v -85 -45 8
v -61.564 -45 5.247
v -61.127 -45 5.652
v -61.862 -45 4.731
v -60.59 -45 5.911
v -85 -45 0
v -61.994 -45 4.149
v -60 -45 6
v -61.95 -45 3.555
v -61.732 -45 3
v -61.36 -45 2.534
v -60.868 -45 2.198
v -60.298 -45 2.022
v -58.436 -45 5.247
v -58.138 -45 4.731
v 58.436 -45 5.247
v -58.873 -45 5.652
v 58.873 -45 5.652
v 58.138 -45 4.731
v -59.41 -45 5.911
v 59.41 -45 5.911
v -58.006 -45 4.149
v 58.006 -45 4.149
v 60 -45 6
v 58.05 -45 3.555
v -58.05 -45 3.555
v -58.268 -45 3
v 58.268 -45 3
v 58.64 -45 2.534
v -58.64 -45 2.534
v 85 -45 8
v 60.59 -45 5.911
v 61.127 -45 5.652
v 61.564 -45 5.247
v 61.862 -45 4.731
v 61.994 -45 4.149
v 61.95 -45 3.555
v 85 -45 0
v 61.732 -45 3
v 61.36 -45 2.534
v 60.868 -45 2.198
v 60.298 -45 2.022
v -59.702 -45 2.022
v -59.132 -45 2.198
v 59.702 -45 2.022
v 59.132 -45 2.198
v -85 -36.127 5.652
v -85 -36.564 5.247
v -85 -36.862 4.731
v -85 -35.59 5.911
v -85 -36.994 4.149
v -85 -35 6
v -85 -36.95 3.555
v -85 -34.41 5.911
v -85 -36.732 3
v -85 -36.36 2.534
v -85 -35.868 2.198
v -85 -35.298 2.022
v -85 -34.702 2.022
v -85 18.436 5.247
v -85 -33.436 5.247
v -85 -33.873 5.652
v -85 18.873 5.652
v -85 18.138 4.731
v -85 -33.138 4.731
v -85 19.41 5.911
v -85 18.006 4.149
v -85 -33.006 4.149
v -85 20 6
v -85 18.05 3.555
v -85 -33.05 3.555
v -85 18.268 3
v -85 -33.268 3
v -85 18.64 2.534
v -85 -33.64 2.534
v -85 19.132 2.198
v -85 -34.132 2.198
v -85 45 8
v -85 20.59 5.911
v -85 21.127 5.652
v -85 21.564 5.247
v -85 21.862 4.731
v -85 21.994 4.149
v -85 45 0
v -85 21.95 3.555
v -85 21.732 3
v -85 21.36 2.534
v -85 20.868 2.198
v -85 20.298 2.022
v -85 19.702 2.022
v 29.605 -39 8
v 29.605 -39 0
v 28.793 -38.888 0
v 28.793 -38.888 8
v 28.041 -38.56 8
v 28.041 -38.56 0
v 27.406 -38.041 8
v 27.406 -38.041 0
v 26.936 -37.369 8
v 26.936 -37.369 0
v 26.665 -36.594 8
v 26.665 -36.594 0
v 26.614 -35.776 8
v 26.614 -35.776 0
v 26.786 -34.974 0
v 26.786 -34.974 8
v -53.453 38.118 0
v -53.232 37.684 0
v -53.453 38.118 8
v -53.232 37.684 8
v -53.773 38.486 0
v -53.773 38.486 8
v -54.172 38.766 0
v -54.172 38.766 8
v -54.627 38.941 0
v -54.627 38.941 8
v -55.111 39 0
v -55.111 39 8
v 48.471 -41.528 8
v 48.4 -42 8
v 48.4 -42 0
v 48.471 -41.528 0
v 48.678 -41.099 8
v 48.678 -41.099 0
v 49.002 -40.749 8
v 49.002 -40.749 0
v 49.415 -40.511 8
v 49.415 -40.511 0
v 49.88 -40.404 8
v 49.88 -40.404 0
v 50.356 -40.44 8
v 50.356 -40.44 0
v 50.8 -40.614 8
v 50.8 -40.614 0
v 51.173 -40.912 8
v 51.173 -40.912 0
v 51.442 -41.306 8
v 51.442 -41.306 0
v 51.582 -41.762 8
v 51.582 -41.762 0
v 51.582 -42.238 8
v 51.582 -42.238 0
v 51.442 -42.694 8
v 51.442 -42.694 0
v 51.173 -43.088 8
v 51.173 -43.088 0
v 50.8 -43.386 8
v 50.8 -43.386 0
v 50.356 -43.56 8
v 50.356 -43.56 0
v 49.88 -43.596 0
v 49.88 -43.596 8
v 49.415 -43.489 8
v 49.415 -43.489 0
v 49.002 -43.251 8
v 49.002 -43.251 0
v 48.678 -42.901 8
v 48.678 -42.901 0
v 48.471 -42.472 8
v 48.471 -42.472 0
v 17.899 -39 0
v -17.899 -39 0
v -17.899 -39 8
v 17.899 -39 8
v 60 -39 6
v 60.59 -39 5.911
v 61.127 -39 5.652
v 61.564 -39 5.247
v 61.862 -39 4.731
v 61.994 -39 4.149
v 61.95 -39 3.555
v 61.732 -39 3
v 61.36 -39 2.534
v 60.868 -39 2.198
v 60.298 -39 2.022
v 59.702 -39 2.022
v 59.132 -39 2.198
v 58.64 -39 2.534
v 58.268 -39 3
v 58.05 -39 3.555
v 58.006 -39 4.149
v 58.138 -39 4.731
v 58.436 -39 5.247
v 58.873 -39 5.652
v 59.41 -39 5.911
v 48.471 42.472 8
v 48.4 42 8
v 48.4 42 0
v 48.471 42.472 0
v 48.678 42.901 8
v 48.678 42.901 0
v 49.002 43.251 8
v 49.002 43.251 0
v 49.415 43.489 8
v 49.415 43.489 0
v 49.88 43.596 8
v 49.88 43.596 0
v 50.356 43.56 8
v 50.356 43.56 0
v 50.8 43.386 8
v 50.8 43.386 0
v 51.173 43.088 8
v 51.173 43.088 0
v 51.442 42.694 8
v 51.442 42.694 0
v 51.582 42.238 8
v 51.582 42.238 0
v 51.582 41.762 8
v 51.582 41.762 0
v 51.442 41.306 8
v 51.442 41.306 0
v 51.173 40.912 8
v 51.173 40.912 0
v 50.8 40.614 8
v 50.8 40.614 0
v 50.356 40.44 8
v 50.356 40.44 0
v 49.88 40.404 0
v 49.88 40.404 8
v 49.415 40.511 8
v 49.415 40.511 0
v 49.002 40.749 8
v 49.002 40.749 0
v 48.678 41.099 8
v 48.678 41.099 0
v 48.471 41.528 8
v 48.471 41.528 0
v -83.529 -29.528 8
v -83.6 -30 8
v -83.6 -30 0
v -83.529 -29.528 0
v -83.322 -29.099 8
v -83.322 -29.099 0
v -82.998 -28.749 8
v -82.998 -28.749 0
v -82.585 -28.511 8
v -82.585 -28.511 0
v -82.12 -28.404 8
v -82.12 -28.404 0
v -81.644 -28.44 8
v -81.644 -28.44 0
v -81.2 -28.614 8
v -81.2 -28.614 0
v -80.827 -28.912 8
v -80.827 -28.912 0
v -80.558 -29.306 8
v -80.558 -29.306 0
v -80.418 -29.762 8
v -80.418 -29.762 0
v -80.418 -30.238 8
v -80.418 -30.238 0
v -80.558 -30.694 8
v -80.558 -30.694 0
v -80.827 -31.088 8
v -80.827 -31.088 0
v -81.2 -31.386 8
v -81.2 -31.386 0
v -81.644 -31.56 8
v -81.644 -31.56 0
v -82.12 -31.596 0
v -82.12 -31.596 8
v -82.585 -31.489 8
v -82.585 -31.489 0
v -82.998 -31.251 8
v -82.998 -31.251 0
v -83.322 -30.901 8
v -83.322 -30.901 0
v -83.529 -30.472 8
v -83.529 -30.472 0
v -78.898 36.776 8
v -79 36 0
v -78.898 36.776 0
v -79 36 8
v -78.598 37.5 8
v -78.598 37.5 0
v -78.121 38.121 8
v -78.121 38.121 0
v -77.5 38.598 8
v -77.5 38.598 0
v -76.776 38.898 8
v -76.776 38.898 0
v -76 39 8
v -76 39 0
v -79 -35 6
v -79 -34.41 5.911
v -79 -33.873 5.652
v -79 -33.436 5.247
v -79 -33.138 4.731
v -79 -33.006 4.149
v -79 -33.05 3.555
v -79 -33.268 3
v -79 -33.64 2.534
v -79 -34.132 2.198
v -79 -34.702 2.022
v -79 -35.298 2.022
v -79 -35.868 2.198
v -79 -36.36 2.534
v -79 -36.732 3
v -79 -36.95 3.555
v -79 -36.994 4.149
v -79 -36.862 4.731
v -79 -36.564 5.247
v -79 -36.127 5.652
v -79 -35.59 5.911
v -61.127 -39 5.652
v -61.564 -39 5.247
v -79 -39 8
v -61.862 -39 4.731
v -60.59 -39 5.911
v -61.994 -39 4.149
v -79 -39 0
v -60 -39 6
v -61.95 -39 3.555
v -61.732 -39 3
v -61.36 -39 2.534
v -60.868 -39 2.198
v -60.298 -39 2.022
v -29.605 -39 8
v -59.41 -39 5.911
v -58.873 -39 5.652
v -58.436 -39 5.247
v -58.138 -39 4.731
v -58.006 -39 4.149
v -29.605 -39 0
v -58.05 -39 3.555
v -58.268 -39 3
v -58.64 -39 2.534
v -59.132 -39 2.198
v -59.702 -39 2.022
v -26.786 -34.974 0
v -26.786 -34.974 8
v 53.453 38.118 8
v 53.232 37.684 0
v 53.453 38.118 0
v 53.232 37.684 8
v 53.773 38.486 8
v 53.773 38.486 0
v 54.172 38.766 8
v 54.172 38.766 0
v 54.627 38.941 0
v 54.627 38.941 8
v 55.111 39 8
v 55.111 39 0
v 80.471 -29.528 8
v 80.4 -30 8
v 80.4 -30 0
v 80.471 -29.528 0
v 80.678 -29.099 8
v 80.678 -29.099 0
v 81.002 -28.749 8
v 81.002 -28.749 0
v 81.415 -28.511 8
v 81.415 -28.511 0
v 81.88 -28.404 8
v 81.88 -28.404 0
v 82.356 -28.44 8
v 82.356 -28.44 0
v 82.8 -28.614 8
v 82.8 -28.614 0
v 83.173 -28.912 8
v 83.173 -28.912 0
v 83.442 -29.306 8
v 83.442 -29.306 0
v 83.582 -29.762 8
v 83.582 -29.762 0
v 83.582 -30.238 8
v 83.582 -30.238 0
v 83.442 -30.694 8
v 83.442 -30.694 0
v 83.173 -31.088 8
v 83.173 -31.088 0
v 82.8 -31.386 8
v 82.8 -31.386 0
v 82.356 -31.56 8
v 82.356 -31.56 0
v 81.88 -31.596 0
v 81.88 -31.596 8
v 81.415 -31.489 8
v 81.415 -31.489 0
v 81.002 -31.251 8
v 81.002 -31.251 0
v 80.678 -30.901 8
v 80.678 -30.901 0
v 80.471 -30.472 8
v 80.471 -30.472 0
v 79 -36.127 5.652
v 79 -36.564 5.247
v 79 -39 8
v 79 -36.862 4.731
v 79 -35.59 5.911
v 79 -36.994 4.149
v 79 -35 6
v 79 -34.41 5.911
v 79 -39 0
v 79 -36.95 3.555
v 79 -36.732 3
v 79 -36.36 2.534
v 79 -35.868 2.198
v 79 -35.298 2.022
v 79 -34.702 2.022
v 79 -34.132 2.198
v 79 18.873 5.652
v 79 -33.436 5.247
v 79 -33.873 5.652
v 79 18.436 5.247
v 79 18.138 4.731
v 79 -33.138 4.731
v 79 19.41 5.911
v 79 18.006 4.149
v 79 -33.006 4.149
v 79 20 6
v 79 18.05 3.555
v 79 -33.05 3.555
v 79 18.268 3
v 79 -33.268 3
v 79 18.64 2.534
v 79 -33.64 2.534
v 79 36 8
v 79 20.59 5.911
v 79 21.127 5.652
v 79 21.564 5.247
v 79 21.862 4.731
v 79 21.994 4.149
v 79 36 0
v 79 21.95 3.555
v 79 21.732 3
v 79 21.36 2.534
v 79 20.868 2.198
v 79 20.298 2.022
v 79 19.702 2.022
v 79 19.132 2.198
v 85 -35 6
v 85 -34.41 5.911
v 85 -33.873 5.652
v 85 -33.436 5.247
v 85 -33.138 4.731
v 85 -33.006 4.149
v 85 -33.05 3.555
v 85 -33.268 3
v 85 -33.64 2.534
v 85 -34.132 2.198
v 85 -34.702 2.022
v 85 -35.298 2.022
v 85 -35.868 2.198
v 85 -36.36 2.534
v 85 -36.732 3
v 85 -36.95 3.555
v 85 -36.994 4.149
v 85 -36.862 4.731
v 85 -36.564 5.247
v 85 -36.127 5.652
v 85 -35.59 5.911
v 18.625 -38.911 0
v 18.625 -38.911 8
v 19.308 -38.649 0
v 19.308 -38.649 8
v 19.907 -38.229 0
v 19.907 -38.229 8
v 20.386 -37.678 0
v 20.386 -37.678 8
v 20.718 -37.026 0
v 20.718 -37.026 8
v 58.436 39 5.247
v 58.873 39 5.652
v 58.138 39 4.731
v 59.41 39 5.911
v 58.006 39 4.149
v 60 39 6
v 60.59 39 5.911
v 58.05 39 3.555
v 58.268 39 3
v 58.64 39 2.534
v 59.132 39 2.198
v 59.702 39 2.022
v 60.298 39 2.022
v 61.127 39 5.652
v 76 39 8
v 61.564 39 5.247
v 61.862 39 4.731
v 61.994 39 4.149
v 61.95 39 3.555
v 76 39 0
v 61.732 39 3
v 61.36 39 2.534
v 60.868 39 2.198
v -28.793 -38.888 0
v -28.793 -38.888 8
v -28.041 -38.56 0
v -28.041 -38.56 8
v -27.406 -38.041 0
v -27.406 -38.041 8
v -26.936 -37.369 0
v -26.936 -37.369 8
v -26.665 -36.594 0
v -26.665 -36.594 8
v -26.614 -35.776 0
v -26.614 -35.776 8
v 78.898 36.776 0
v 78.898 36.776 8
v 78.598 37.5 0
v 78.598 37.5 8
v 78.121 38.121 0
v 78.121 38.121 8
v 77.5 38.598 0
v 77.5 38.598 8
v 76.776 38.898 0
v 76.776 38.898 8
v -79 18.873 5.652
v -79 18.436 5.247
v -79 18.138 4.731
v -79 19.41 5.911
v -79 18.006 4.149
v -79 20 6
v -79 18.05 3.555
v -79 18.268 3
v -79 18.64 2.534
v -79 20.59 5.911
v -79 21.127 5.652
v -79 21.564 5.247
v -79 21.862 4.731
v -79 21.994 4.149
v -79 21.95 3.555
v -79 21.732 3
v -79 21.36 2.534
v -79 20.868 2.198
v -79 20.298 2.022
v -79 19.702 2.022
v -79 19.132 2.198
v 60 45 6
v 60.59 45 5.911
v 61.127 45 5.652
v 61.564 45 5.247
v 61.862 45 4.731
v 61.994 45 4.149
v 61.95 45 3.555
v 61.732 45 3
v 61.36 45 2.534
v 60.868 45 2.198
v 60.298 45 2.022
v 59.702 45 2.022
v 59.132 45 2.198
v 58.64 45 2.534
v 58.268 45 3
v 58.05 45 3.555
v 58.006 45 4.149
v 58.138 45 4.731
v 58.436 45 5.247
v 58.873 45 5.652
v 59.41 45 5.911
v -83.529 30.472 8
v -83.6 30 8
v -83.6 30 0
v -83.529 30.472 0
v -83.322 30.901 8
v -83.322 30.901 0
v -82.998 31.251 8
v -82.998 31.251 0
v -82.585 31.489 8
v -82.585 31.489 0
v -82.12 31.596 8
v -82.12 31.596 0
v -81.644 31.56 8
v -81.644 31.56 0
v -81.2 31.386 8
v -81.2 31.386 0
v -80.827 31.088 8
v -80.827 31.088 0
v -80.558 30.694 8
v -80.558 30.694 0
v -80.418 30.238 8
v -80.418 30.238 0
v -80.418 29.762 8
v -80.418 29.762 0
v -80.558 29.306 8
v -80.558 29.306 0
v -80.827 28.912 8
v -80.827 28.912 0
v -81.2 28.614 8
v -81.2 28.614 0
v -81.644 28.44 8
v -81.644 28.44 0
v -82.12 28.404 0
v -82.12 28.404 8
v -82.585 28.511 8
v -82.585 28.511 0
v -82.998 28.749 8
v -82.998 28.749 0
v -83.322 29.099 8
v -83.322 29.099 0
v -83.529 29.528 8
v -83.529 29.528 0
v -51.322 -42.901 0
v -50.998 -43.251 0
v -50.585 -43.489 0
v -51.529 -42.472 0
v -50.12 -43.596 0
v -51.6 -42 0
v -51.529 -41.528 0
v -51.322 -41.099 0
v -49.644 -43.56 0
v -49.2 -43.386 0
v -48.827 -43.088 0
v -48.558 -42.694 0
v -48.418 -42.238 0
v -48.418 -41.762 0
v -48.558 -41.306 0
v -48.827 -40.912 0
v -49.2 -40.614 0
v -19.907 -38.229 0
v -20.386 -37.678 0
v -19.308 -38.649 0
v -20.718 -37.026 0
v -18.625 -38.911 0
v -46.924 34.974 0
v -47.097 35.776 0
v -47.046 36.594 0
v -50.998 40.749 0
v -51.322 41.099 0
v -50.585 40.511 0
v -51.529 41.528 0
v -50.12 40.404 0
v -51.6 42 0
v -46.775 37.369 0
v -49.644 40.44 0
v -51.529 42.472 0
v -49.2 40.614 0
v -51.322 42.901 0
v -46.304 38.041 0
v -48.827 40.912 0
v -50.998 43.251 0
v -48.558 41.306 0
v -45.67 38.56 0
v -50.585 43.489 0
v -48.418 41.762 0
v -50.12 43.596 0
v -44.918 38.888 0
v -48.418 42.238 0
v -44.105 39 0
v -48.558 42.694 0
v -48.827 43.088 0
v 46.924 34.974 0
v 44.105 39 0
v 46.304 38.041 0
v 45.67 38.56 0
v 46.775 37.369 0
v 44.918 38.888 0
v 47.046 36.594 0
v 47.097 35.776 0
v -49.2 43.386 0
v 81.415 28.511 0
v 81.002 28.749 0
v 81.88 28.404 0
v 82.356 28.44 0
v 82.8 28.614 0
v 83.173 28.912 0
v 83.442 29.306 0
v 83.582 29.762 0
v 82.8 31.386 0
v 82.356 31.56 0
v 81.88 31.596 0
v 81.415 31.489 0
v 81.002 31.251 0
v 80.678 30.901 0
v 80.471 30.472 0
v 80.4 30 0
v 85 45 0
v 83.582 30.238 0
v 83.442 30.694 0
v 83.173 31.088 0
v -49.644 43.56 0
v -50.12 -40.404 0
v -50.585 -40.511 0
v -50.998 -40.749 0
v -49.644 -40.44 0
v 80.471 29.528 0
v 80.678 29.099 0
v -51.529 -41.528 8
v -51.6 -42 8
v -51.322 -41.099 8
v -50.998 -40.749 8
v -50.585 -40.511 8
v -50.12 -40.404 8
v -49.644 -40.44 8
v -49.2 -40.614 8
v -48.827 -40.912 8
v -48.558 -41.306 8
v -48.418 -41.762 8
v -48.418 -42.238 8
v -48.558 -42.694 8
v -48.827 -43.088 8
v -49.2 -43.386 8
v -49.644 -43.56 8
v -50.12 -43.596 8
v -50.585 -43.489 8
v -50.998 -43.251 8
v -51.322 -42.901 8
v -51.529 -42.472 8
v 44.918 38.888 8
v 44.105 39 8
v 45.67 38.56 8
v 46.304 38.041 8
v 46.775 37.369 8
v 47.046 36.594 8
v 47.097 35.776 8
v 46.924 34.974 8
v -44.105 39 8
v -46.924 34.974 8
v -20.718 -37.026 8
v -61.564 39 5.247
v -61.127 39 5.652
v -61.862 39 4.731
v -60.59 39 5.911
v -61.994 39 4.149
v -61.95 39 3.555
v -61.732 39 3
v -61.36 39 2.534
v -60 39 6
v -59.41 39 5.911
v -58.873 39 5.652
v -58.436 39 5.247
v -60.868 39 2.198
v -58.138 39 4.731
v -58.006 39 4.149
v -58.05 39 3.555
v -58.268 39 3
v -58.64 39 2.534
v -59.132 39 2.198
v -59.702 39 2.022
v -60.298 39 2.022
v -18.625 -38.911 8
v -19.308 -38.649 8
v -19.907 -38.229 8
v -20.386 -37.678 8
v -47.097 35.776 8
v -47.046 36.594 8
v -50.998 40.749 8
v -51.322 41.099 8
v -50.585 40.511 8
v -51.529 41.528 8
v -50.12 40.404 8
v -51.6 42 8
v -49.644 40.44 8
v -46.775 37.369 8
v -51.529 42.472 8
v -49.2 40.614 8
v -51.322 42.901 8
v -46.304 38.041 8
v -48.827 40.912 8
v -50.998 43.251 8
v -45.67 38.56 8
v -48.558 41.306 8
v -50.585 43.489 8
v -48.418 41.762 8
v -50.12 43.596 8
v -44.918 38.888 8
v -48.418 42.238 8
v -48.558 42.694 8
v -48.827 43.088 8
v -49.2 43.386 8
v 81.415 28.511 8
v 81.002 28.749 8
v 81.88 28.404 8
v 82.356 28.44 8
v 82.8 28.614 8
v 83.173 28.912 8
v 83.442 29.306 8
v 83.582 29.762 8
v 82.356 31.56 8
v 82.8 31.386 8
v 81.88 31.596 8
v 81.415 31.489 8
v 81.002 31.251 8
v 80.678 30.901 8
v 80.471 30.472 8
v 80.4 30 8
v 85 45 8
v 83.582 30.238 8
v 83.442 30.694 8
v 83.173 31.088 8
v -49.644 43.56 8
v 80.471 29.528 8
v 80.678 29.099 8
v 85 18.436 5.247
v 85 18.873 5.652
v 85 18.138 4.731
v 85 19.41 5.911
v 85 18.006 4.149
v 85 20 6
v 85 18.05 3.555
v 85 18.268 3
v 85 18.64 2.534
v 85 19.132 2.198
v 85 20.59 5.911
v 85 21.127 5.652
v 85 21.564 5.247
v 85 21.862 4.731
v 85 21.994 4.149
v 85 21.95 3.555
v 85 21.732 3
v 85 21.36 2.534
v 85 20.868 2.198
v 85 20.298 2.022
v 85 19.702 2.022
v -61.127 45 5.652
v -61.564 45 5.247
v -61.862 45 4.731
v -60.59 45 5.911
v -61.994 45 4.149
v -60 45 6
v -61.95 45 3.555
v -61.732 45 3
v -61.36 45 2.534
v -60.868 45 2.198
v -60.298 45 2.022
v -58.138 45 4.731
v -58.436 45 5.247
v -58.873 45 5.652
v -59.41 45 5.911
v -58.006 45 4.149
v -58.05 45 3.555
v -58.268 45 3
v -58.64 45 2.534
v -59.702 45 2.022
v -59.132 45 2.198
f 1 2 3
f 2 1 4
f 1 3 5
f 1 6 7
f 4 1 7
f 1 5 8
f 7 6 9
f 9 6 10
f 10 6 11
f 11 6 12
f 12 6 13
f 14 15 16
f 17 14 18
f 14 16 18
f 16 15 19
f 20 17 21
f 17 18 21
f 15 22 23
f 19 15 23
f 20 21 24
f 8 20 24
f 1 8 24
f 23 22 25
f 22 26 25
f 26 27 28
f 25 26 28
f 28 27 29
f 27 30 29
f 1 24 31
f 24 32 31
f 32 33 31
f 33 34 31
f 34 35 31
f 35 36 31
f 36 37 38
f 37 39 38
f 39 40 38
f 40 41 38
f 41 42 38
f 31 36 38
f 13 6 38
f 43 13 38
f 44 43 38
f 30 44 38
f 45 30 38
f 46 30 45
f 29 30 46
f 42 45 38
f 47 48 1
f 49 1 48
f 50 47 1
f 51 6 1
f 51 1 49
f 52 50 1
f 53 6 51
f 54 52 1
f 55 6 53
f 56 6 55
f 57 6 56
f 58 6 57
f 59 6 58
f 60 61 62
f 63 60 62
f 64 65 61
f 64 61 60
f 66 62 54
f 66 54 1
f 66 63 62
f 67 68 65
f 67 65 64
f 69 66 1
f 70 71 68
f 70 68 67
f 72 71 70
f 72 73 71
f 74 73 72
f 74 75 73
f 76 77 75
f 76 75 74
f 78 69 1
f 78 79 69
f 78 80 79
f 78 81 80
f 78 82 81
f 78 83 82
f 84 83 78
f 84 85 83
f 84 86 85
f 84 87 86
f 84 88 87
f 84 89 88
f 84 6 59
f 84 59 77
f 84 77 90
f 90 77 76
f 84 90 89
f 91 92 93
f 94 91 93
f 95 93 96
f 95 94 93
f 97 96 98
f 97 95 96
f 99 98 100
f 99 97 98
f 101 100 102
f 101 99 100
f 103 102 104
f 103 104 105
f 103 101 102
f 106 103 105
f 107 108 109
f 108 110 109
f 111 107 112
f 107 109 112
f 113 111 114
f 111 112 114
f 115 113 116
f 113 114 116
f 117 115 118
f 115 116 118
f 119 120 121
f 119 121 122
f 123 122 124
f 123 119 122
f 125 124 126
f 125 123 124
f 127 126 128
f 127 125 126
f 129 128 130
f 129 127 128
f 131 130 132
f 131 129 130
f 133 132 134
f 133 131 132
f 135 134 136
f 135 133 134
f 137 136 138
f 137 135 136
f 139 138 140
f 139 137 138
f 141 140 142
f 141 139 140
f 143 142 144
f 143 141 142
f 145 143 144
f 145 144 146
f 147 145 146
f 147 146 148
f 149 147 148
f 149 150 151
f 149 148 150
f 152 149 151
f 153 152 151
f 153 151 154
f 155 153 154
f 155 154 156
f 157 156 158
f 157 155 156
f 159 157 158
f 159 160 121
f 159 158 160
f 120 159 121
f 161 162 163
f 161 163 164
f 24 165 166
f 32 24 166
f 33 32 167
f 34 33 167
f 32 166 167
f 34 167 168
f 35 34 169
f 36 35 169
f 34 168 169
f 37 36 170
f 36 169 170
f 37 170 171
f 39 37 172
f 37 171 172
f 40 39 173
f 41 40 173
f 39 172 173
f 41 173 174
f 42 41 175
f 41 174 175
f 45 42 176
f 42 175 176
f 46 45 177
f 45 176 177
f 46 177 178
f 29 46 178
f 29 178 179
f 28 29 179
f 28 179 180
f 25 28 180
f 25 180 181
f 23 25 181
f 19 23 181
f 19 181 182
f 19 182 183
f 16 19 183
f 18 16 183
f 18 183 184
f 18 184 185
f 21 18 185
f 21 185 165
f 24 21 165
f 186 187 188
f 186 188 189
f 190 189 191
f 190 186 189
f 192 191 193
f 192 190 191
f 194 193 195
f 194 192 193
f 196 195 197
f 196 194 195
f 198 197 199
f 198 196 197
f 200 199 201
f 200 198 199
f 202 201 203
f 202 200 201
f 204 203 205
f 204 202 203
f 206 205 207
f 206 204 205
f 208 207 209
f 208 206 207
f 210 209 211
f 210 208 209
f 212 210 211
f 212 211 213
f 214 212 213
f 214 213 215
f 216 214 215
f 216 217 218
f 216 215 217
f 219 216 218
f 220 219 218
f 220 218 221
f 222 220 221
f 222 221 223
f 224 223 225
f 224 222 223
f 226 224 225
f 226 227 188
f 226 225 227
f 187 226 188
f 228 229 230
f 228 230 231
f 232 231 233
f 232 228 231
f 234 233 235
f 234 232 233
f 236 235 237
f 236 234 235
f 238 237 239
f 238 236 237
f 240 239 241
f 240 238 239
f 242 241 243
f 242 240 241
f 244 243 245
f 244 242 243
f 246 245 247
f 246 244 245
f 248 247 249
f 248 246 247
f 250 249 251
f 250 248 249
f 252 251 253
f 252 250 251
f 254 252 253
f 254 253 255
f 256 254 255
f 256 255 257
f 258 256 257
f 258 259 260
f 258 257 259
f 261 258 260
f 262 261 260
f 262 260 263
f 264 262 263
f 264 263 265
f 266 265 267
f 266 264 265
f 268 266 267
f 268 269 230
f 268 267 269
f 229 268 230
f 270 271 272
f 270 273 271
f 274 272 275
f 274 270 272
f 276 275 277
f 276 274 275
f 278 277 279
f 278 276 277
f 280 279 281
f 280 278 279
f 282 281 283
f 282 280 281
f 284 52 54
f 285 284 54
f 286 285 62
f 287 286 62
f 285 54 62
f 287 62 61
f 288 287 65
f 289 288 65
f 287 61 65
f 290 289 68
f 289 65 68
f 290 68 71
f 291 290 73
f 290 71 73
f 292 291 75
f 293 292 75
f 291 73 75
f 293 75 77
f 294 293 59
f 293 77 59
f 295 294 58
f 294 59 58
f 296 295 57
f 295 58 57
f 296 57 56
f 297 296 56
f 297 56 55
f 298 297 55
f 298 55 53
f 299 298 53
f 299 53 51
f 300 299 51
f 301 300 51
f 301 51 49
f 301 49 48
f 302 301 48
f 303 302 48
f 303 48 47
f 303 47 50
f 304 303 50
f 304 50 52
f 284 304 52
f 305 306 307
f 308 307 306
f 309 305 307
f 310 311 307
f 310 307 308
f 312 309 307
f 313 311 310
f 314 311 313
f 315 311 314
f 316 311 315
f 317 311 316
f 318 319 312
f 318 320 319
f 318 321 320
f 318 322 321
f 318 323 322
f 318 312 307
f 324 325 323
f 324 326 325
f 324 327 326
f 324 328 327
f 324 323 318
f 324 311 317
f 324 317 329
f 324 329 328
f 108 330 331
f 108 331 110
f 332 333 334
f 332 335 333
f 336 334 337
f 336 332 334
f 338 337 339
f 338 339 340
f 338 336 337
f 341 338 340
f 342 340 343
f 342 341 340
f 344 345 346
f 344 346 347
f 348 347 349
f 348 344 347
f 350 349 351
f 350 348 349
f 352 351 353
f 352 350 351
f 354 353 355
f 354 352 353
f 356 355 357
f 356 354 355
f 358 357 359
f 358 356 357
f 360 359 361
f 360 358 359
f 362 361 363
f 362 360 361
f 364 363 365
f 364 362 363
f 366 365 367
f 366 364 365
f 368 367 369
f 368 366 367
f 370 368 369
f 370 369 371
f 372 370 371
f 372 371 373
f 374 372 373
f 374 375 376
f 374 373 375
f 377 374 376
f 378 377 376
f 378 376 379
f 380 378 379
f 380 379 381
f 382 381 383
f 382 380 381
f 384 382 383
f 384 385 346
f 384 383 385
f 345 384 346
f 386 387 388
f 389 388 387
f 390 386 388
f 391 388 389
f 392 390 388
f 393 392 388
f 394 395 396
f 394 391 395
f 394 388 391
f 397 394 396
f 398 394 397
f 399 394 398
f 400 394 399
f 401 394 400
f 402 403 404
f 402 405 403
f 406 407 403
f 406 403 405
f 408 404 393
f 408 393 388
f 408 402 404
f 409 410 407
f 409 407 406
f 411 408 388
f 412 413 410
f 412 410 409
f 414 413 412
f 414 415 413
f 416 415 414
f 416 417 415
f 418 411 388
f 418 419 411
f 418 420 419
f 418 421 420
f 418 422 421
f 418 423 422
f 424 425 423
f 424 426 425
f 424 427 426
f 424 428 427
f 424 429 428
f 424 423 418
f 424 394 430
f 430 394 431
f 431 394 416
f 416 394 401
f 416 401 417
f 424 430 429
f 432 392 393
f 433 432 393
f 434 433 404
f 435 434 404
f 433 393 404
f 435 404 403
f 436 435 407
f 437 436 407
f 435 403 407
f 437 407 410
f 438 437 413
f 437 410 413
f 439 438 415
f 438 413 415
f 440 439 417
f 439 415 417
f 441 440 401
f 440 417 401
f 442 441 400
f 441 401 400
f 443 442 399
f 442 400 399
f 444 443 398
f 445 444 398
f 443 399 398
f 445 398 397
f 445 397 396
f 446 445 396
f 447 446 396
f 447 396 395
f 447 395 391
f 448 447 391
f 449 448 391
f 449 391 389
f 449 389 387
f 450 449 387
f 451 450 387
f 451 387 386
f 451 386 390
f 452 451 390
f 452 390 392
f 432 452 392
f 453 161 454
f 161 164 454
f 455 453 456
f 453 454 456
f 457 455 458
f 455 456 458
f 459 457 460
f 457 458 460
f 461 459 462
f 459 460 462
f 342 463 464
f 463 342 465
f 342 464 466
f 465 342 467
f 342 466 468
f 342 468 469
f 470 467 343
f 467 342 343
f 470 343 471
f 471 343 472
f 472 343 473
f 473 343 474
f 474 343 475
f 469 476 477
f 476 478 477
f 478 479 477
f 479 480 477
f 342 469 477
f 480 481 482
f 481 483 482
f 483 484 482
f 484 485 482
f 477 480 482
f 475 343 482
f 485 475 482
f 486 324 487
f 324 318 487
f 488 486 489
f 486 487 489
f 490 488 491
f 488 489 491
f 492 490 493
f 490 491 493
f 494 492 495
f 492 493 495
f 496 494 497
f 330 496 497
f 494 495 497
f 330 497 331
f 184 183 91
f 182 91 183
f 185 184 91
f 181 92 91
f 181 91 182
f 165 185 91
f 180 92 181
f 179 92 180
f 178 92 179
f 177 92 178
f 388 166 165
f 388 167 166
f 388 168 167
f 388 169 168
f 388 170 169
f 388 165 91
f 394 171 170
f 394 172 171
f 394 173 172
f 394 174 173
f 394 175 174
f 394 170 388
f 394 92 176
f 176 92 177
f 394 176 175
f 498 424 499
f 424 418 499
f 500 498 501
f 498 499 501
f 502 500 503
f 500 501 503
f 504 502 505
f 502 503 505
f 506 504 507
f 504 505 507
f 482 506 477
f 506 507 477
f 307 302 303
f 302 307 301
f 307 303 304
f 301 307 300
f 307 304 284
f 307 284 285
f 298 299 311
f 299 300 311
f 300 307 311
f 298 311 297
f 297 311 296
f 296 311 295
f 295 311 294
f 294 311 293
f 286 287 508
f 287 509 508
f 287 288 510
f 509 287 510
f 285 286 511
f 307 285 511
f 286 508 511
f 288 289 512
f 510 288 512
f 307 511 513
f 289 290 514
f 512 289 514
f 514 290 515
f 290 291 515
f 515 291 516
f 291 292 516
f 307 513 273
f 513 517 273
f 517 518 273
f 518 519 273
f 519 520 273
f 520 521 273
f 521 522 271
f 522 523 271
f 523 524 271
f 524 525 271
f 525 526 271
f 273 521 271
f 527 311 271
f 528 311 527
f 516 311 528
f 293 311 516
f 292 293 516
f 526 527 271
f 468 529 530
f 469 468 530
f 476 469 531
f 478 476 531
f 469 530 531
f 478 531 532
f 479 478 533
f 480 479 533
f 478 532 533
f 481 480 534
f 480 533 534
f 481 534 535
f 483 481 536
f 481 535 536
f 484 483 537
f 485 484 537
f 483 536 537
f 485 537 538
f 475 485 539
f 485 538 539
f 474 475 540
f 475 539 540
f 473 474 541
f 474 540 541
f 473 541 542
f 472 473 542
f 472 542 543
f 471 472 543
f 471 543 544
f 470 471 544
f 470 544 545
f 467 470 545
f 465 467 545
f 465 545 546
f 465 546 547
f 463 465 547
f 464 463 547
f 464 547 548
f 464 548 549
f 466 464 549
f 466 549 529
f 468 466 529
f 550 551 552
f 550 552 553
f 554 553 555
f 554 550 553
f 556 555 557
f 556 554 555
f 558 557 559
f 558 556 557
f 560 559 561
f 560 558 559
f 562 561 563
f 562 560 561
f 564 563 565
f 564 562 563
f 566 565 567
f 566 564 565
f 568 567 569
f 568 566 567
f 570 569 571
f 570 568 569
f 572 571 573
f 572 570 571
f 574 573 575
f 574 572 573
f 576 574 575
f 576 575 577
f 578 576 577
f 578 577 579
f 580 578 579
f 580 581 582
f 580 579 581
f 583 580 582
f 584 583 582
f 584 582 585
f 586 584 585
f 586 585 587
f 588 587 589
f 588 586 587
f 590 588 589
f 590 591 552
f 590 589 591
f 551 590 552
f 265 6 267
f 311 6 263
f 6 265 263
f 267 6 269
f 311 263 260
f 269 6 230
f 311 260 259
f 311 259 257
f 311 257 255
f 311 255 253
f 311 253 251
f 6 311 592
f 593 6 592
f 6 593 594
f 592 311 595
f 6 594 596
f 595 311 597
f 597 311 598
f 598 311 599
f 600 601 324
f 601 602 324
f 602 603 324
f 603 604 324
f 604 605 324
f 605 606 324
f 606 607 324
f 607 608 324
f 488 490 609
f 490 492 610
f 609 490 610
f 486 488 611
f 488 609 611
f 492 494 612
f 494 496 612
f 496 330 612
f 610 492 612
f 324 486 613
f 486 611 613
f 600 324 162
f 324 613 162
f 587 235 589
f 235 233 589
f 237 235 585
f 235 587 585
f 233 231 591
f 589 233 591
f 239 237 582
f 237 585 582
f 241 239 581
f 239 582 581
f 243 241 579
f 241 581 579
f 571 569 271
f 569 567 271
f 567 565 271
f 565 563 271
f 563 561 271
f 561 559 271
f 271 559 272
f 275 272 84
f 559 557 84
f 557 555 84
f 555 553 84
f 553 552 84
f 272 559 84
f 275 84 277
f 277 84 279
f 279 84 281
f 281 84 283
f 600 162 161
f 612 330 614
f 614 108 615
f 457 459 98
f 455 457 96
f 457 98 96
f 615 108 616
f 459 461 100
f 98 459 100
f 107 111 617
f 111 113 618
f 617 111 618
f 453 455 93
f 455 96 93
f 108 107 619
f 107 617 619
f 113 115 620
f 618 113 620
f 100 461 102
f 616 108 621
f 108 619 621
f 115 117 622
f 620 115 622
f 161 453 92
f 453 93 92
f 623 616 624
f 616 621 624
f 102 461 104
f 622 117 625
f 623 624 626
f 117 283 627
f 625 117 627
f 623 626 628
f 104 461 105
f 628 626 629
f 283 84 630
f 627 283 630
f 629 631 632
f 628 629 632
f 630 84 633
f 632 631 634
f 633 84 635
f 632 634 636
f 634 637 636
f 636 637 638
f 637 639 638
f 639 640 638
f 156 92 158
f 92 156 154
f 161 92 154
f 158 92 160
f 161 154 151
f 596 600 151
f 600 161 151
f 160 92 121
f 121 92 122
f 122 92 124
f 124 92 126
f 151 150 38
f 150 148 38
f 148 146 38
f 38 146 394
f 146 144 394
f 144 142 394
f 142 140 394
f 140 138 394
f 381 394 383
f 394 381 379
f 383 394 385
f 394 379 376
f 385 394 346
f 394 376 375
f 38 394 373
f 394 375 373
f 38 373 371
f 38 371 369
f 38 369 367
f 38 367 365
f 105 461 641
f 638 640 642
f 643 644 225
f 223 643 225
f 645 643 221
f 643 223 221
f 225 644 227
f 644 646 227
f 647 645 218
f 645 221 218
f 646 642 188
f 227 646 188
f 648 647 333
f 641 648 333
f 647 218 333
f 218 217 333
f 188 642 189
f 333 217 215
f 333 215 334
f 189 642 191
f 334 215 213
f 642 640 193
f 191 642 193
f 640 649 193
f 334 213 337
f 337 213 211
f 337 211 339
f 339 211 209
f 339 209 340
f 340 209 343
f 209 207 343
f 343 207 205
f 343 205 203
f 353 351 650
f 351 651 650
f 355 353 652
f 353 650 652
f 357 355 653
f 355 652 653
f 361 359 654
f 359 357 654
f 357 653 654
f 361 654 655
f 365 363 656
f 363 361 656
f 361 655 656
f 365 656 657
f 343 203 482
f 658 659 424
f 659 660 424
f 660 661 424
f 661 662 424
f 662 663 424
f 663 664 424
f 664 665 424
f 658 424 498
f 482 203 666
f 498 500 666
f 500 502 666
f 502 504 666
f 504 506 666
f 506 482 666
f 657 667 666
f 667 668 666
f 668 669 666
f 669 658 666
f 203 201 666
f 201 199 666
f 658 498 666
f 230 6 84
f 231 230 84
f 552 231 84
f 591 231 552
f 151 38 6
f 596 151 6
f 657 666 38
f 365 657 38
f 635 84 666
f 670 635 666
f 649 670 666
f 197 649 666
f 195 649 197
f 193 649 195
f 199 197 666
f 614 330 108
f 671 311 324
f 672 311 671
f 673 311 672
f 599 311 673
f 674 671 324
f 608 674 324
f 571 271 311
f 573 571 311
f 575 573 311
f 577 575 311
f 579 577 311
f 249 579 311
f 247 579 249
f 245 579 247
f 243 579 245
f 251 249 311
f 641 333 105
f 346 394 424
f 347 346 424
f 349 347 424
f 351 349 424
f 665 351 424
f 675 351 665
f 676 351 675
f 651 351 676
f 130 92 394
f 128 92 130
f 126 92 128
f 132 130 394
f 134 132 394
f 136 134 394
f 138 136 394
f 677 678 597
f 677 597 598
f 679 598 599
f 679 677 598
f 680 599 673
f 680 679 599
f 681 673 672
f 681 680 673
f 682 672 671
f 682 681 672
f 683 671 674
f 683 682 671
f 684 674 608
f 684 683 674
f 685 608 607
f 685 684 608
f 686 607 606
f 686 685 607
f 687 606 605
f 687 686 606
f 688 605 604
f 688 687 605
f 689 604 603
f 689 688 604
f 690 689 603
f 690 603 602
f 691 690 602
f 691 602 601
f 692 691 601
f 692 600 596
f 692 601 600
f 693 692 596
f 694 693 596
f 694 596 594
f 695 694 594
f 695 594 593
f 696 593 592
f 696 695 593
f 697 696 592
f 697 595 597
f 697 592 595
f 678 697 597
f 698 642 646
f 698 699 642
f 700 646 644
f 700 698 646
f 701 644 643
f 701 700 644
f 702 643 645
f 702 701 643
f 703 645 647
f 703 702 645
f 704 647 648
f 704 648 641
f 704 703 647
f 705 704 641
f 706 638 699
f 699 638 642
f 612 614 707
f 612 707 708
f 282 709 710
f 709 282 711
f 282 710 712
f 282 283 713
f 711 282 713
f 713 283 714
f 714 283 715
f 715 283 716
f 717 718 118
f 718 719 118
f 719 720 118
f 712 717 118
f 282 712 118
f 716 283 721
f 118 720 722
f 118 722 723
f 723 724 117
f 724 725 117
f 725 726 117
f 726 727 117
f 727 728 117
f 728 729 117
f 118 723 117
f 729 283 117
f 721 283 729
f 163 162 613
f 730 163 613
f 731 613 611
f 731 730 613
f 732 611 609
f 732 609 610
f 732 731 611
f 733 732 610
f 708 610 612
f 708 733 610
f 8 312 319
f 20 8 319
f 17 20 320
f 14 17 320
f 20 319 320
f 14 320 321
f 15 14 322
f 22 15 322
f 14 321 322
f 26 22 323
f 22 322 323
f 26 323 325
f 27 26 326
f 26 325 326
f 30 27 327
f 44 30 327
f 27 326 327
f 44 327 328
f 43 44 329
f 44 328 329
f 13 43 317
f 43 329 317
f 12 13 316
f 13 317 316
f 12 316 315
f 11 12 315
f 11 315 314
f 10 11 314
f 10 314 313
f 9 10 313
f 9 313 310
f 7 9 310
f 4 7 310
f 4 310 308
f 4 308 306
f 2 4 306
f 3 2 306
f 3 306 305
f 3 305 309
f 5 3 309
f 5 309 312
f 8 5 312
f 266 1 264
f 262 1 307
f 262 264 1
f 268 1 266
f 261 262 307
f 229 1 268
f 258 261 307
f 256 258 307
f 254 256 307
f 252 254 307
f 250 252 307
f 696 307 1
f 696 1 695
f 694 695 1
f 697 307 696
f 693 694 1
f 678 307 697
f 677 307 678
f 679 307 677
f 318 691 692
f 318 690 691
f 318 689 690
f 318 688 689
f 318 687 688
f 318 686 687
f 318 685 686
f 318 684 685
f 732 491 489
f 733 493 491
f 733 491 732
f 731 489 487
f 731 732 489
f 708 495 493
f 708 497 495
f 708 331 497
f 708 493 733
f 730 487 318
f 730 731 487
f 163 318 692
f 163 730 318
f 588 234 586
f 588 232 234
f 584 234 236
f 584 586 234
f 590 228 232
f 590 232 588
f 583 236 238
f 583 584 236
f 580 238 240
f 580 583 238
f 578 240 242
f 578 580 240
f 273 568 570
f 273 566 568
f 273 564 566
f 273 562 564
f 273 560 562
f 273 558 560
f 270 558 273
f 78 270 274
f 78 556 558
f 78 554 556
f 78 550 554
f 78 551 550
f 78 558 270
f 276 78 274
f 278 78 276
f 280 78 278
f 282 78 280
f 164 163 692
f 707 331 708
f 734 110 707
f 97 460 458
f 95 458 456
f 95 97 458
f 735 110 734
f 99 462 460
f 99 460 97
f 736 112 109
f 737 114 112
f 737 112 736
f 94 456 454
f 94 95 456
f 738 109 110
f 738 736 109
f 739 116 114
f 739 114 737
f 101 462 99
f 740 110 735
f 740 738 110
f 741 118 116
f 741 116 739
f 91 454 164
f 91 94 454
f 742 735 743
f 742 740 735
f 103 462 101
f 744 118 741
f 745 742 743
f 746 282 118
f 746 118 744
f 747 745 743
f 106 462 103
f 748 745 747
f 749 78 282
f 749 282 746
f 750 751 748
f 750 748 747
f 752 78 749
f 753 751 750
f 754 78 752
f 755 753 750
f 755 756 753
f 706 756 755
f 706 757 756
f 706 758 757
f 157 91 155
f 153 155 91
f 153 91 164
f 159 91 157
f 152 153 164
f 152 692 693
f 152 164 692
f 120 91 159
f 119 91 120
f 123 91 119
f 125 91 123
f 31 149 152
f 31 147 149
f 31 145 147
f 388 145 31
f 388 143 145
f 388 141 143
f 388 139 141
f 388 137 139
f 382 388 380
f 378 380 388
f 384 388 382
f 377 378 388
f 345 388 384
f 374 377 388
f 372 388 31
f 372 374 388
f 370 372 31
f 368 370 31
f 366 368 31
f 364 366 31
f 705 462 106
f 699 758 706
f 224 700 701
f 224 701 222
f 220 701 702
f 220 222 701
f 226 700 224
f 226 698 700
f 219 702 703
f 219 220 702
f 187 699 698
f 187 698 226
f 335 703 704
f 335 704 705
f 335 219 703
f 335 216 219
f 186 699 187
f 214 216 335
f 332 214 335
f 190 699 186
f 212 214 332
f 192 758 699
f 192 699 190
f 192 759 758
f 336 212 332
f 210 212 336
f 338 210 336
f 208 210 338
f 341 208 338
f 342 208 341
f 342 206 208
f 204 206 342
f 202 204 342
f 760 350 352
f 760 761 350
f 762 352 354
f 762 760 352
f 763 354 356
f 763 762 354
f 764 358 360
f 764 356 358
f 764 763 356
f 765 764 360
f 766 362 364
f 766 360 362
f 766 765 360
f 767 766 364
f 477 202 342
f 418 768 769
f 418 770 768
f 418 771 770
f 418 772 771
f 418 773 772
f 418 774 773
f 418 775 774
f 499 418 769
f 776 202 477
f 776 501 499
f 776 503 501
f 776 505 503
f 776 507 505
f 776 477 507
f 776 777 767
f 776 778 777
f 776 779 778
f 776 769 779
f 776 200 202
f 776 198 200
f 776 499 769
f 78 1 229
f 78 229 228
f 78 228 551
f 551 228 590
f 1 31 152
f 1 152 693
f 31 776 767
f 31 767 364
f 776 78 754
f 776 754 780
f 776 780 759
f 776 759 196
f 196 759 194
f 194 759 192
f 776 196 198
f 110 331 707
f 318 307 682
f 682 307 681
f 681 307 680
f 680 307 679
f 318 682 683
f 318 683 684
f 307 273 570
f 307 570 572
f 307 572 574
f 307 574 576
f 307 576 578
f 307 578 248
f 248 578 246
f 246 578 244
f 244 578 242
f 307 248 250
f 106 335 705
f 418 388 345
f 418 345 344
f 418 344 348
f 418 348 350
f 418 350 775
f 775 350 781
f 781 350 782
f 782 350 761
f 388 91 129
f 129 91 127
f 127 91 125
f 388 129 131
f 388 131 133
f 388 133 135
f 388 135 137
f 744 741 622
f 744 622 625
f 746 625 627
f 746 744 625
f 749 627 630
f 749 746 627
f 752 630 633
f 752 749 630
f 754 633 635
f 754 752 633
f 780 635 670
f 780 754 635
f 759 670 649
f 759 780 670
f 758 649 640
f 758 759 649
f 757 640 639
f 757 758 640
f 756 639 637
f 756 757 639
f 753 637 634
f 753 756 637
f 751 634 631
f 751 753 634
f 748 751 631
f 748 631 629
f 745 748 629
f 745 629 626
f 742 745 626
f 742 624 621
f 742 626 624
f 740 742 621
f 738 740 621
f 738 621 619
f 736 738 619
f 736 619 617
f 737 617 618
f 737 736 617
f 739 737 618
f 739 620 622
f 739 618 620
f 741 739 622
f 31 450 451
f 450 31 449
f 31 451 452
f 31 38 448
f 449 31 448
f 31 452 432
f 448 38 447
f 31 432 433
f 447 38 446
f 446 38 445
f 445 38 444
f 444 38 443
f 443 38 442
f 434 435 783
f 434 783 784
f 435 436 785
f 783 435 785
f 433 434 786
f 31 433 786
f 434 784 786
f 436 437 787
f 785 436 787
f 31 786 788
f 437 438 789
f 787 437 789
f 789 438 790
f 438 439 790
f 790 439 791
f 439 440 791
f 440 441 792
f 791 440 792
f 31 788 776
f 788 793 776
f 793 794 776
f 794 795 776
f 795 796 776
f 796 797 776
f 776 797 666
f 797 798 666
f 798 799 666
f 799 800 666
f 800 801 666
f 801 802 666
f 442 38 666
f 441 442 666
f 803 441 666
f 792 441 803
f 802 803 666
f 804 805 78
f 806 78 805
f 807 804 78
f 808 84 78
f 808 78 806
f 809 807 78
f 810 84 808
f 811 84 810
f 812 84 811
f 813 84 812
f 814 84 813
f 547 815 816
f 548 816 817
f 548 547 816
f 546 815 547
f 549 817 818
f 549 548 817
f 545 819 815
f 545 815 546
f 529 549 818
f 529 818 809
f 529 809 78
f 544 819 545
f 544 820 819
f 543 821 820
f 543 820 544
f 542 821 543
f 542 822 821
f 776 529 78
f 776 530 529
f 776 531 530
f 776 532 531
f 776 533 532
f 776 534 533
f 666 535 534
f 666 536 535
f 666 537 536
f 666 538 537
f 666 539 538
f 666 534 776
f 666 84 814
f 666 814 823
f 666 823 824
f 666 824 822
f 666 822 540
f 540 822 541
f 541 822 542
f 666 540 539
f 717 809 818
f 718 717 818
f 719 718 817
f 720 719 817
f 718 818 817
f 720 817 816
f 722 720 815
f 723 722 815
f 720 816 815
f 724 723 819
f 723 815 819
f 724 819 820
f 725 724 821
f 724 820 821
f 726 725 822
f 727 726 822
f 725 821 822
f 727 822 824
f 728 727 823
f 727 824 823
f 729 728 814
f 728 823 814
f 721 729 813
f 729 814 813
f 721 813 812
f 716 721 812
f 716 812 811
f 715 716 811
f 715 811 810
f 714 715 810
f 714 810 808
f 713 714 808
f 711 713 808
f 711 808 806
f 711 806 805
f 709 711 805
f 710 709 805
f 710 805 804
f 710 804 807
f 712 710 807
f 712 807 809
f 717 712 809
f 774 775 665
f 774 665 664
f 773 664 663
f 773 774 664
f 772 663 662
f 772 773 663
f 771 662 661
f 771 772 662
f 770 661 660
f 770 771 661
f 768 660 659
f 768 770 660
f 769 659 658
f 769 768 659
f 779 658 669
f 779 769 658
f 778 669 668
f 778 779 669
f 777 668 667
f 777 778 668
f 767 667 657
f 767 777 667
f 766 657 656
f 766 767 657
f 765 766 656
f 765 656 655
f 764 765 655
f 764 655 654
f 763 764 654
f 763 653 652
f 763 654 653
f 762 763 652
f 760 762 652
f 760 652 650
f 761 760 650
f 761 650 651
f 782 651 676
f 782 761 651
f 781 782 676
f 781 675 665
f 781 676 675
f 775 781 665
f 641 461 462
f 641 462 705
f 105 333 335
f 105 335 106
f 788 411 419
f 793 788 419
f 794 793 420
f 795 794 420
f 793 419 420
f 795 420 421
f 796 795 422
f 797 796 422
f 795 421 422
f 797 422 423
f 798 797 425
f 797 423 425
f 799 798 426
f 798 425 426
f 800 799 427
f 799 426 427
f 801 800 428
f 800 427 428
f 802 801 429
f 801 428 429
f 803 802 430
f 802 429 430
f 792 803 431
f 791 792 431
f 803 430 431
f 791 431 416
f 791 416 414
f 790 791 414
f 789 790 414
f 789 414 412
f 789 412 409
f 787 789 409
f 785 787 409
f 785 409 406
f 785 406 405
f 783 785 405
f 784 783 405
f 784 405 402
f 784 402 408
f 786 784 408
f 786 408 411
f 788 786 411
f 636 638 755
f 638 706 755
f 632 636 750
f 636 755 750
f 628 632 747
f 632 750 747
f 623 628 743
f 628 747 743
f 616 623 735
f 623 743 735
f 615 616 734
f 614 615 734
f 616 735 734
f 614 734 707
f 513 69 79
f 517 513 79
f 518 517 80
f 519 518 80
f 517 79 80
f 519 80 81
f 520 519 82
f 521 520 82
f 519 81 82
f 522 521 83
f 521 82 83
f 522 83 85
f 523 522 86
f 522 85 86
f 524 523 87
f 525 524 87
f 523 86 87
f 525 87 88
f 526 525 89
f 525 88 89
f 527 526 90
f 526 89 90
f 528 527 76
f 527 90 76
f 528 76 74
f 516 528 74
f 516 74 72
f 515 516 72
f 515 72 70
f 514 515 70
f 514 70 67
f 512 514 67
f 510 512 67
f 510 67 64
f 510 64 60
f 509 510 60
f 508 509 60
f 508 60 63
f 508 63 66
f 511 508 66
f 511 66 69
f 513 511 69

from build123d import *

# Parameters (mm, degrees)
SKETCH_1_W               = 170
SKETCH_1_H               = 90
SKETCH_1_W_2             = 158
SKETCH_1_H_2             = 78
EXTRUDE_1_DEPTH          = 8
SKETCH_2_R               = 2
CUT_EXTRUDE_1_DEPTH      = 177.036927944
SKETCH_3_R               = 2
CUT_EXTRUDE_2_DEPTH      = 125.05240828
CUT_EXTRUDE_3_DEPTH      = 97.509066932
CUT_EXTRUDE_3_DEPTH_BACK = 97.509066932
SKETCH_4_R               = 1.6
EXTRUDE_2_DEPTH          = 8
FILLET_2_R               = 3
FILLET_3_R               = 2


with BuildPart() as part:
    # 草图1 → 凸台-拉伸1 (new body)
    with BuildSketch(Plane.XY):
        Rectangle(SKETCH_1_W, SKETCH_1_H)
        Rectangle(SKETCH_1_W_2, SKETCH_1_H_2, mode=Mode.SUBTRACT)
    extrude(amount=EXTRUDE_1_DEPTH)

    # 草图2 → 切除-拉伸1 (cut, through all)
    with BuildSketch(Plane.ZY.offset(85)):
        with Locations((4, 20)):
            Circle(SKETCH_2_R)
        with Locations((4, -35)):
            Circle(SKETCH_2_R)
    extrude(amount=-CUT_EXTRUDE_1_DEPTH, mode=Mode.SUBTRACT)

    # 草图3 → 切除-拉伸2 (cut, through all)
    with BuildSketch(Plane(origin=(0, 45, 0), x_dir=(1, 0, 0), z_dir=(0, 1, 0))):
        with Locations(Location((-60, -4, 0), (0, 0, 270))):
            Circle(SKETCH_3_R)
        with Locations(Location((60, -4, 0), (0, 0, 270))):
            Circle(SKETCH_3_R)
    extrude(amount=-CUT_EXTRUDE_2_DEPTH, mode=Mode.SUBTRACT)

    # 草图4 → 切除-拉伸3 (cut, two sides: drawn at the far end of the back side and taken through both)
    with BuildSketch(Plane(origin=(0, 0, 0), x_dir=(-1, 0, 0), z_dir=(0, 0, -1)).offset(-CUT_EXTRUDE_3_DEPTH_BACK)):
        with Locations((-82, 30)):
            Circle(SKETCH_4_R)
        with Locations((-82, -30)):
            Circle(SKETCH_4_R)
        with Locations((82, 30)):
            Circle(SKETCH_4_R)
        with Locations((82, -30)):
            Circle(SKETCH_4_R)
        with Locations((-50, 42)):
            Circle(SKETCH_4_R)
        with Locations((50, 42)):
            Circle(SKETCH_4_R)
        with Locations((-50, -42)):
            Circle(SKETCH_4_R)
        with Locations((50, -42)):
            Circle(SKETCH_4_R)
    extrude(amount=CUT_EXTRUDE_3_DEPTH + CUT_EXTRUDE_3_DEPTH_BACK, mode=Mode.SUBTRACT)

    # 草图5 → 凸台-拉伸2 (add)
    with BuildSketch(Plane(origin=(0, 0, 0), x_dir=(-1, 0, 0), z_dir=(0, 0, -1))):
        Polygon((-53.710567135, 39), (-25.320888862, -39), (-20, -39), (-48.389678273, 39), align=None)
        Polygon((53.710567135, 39), (48.389678273, 39), (20, -39), (25.320888862, -39), align=None)
    extrude(amount=-EXTRUDE_2_DEPTH)

    # 圆角2
    fillet_2_edges = [part.edges().sort_by_distance(p)[0] for p in [
        (25.320888862, -39, 4),
        (20, -39, 4),
        (48.389678273, 39, 4),
        (-48.389678273, 39, 4),
        (-20, -39, 4),
        (-25.320888862, -39, 4),
        (79, 39, 4),
        (-79, 39, 4),
    ]]
    fillet(fillet_2_edges, radius=FILLET_2_R)

    # 圆角3
    fillet_3_edges = [part.edges().sort_by_distance(p)[0] for p in [
        (53.710567135, 39, 4),
        (-53.710567135, 39, 4),
    ]]
    fillet(fillet_3_edges, radius=FILLET_3_R)


solid = part.part
